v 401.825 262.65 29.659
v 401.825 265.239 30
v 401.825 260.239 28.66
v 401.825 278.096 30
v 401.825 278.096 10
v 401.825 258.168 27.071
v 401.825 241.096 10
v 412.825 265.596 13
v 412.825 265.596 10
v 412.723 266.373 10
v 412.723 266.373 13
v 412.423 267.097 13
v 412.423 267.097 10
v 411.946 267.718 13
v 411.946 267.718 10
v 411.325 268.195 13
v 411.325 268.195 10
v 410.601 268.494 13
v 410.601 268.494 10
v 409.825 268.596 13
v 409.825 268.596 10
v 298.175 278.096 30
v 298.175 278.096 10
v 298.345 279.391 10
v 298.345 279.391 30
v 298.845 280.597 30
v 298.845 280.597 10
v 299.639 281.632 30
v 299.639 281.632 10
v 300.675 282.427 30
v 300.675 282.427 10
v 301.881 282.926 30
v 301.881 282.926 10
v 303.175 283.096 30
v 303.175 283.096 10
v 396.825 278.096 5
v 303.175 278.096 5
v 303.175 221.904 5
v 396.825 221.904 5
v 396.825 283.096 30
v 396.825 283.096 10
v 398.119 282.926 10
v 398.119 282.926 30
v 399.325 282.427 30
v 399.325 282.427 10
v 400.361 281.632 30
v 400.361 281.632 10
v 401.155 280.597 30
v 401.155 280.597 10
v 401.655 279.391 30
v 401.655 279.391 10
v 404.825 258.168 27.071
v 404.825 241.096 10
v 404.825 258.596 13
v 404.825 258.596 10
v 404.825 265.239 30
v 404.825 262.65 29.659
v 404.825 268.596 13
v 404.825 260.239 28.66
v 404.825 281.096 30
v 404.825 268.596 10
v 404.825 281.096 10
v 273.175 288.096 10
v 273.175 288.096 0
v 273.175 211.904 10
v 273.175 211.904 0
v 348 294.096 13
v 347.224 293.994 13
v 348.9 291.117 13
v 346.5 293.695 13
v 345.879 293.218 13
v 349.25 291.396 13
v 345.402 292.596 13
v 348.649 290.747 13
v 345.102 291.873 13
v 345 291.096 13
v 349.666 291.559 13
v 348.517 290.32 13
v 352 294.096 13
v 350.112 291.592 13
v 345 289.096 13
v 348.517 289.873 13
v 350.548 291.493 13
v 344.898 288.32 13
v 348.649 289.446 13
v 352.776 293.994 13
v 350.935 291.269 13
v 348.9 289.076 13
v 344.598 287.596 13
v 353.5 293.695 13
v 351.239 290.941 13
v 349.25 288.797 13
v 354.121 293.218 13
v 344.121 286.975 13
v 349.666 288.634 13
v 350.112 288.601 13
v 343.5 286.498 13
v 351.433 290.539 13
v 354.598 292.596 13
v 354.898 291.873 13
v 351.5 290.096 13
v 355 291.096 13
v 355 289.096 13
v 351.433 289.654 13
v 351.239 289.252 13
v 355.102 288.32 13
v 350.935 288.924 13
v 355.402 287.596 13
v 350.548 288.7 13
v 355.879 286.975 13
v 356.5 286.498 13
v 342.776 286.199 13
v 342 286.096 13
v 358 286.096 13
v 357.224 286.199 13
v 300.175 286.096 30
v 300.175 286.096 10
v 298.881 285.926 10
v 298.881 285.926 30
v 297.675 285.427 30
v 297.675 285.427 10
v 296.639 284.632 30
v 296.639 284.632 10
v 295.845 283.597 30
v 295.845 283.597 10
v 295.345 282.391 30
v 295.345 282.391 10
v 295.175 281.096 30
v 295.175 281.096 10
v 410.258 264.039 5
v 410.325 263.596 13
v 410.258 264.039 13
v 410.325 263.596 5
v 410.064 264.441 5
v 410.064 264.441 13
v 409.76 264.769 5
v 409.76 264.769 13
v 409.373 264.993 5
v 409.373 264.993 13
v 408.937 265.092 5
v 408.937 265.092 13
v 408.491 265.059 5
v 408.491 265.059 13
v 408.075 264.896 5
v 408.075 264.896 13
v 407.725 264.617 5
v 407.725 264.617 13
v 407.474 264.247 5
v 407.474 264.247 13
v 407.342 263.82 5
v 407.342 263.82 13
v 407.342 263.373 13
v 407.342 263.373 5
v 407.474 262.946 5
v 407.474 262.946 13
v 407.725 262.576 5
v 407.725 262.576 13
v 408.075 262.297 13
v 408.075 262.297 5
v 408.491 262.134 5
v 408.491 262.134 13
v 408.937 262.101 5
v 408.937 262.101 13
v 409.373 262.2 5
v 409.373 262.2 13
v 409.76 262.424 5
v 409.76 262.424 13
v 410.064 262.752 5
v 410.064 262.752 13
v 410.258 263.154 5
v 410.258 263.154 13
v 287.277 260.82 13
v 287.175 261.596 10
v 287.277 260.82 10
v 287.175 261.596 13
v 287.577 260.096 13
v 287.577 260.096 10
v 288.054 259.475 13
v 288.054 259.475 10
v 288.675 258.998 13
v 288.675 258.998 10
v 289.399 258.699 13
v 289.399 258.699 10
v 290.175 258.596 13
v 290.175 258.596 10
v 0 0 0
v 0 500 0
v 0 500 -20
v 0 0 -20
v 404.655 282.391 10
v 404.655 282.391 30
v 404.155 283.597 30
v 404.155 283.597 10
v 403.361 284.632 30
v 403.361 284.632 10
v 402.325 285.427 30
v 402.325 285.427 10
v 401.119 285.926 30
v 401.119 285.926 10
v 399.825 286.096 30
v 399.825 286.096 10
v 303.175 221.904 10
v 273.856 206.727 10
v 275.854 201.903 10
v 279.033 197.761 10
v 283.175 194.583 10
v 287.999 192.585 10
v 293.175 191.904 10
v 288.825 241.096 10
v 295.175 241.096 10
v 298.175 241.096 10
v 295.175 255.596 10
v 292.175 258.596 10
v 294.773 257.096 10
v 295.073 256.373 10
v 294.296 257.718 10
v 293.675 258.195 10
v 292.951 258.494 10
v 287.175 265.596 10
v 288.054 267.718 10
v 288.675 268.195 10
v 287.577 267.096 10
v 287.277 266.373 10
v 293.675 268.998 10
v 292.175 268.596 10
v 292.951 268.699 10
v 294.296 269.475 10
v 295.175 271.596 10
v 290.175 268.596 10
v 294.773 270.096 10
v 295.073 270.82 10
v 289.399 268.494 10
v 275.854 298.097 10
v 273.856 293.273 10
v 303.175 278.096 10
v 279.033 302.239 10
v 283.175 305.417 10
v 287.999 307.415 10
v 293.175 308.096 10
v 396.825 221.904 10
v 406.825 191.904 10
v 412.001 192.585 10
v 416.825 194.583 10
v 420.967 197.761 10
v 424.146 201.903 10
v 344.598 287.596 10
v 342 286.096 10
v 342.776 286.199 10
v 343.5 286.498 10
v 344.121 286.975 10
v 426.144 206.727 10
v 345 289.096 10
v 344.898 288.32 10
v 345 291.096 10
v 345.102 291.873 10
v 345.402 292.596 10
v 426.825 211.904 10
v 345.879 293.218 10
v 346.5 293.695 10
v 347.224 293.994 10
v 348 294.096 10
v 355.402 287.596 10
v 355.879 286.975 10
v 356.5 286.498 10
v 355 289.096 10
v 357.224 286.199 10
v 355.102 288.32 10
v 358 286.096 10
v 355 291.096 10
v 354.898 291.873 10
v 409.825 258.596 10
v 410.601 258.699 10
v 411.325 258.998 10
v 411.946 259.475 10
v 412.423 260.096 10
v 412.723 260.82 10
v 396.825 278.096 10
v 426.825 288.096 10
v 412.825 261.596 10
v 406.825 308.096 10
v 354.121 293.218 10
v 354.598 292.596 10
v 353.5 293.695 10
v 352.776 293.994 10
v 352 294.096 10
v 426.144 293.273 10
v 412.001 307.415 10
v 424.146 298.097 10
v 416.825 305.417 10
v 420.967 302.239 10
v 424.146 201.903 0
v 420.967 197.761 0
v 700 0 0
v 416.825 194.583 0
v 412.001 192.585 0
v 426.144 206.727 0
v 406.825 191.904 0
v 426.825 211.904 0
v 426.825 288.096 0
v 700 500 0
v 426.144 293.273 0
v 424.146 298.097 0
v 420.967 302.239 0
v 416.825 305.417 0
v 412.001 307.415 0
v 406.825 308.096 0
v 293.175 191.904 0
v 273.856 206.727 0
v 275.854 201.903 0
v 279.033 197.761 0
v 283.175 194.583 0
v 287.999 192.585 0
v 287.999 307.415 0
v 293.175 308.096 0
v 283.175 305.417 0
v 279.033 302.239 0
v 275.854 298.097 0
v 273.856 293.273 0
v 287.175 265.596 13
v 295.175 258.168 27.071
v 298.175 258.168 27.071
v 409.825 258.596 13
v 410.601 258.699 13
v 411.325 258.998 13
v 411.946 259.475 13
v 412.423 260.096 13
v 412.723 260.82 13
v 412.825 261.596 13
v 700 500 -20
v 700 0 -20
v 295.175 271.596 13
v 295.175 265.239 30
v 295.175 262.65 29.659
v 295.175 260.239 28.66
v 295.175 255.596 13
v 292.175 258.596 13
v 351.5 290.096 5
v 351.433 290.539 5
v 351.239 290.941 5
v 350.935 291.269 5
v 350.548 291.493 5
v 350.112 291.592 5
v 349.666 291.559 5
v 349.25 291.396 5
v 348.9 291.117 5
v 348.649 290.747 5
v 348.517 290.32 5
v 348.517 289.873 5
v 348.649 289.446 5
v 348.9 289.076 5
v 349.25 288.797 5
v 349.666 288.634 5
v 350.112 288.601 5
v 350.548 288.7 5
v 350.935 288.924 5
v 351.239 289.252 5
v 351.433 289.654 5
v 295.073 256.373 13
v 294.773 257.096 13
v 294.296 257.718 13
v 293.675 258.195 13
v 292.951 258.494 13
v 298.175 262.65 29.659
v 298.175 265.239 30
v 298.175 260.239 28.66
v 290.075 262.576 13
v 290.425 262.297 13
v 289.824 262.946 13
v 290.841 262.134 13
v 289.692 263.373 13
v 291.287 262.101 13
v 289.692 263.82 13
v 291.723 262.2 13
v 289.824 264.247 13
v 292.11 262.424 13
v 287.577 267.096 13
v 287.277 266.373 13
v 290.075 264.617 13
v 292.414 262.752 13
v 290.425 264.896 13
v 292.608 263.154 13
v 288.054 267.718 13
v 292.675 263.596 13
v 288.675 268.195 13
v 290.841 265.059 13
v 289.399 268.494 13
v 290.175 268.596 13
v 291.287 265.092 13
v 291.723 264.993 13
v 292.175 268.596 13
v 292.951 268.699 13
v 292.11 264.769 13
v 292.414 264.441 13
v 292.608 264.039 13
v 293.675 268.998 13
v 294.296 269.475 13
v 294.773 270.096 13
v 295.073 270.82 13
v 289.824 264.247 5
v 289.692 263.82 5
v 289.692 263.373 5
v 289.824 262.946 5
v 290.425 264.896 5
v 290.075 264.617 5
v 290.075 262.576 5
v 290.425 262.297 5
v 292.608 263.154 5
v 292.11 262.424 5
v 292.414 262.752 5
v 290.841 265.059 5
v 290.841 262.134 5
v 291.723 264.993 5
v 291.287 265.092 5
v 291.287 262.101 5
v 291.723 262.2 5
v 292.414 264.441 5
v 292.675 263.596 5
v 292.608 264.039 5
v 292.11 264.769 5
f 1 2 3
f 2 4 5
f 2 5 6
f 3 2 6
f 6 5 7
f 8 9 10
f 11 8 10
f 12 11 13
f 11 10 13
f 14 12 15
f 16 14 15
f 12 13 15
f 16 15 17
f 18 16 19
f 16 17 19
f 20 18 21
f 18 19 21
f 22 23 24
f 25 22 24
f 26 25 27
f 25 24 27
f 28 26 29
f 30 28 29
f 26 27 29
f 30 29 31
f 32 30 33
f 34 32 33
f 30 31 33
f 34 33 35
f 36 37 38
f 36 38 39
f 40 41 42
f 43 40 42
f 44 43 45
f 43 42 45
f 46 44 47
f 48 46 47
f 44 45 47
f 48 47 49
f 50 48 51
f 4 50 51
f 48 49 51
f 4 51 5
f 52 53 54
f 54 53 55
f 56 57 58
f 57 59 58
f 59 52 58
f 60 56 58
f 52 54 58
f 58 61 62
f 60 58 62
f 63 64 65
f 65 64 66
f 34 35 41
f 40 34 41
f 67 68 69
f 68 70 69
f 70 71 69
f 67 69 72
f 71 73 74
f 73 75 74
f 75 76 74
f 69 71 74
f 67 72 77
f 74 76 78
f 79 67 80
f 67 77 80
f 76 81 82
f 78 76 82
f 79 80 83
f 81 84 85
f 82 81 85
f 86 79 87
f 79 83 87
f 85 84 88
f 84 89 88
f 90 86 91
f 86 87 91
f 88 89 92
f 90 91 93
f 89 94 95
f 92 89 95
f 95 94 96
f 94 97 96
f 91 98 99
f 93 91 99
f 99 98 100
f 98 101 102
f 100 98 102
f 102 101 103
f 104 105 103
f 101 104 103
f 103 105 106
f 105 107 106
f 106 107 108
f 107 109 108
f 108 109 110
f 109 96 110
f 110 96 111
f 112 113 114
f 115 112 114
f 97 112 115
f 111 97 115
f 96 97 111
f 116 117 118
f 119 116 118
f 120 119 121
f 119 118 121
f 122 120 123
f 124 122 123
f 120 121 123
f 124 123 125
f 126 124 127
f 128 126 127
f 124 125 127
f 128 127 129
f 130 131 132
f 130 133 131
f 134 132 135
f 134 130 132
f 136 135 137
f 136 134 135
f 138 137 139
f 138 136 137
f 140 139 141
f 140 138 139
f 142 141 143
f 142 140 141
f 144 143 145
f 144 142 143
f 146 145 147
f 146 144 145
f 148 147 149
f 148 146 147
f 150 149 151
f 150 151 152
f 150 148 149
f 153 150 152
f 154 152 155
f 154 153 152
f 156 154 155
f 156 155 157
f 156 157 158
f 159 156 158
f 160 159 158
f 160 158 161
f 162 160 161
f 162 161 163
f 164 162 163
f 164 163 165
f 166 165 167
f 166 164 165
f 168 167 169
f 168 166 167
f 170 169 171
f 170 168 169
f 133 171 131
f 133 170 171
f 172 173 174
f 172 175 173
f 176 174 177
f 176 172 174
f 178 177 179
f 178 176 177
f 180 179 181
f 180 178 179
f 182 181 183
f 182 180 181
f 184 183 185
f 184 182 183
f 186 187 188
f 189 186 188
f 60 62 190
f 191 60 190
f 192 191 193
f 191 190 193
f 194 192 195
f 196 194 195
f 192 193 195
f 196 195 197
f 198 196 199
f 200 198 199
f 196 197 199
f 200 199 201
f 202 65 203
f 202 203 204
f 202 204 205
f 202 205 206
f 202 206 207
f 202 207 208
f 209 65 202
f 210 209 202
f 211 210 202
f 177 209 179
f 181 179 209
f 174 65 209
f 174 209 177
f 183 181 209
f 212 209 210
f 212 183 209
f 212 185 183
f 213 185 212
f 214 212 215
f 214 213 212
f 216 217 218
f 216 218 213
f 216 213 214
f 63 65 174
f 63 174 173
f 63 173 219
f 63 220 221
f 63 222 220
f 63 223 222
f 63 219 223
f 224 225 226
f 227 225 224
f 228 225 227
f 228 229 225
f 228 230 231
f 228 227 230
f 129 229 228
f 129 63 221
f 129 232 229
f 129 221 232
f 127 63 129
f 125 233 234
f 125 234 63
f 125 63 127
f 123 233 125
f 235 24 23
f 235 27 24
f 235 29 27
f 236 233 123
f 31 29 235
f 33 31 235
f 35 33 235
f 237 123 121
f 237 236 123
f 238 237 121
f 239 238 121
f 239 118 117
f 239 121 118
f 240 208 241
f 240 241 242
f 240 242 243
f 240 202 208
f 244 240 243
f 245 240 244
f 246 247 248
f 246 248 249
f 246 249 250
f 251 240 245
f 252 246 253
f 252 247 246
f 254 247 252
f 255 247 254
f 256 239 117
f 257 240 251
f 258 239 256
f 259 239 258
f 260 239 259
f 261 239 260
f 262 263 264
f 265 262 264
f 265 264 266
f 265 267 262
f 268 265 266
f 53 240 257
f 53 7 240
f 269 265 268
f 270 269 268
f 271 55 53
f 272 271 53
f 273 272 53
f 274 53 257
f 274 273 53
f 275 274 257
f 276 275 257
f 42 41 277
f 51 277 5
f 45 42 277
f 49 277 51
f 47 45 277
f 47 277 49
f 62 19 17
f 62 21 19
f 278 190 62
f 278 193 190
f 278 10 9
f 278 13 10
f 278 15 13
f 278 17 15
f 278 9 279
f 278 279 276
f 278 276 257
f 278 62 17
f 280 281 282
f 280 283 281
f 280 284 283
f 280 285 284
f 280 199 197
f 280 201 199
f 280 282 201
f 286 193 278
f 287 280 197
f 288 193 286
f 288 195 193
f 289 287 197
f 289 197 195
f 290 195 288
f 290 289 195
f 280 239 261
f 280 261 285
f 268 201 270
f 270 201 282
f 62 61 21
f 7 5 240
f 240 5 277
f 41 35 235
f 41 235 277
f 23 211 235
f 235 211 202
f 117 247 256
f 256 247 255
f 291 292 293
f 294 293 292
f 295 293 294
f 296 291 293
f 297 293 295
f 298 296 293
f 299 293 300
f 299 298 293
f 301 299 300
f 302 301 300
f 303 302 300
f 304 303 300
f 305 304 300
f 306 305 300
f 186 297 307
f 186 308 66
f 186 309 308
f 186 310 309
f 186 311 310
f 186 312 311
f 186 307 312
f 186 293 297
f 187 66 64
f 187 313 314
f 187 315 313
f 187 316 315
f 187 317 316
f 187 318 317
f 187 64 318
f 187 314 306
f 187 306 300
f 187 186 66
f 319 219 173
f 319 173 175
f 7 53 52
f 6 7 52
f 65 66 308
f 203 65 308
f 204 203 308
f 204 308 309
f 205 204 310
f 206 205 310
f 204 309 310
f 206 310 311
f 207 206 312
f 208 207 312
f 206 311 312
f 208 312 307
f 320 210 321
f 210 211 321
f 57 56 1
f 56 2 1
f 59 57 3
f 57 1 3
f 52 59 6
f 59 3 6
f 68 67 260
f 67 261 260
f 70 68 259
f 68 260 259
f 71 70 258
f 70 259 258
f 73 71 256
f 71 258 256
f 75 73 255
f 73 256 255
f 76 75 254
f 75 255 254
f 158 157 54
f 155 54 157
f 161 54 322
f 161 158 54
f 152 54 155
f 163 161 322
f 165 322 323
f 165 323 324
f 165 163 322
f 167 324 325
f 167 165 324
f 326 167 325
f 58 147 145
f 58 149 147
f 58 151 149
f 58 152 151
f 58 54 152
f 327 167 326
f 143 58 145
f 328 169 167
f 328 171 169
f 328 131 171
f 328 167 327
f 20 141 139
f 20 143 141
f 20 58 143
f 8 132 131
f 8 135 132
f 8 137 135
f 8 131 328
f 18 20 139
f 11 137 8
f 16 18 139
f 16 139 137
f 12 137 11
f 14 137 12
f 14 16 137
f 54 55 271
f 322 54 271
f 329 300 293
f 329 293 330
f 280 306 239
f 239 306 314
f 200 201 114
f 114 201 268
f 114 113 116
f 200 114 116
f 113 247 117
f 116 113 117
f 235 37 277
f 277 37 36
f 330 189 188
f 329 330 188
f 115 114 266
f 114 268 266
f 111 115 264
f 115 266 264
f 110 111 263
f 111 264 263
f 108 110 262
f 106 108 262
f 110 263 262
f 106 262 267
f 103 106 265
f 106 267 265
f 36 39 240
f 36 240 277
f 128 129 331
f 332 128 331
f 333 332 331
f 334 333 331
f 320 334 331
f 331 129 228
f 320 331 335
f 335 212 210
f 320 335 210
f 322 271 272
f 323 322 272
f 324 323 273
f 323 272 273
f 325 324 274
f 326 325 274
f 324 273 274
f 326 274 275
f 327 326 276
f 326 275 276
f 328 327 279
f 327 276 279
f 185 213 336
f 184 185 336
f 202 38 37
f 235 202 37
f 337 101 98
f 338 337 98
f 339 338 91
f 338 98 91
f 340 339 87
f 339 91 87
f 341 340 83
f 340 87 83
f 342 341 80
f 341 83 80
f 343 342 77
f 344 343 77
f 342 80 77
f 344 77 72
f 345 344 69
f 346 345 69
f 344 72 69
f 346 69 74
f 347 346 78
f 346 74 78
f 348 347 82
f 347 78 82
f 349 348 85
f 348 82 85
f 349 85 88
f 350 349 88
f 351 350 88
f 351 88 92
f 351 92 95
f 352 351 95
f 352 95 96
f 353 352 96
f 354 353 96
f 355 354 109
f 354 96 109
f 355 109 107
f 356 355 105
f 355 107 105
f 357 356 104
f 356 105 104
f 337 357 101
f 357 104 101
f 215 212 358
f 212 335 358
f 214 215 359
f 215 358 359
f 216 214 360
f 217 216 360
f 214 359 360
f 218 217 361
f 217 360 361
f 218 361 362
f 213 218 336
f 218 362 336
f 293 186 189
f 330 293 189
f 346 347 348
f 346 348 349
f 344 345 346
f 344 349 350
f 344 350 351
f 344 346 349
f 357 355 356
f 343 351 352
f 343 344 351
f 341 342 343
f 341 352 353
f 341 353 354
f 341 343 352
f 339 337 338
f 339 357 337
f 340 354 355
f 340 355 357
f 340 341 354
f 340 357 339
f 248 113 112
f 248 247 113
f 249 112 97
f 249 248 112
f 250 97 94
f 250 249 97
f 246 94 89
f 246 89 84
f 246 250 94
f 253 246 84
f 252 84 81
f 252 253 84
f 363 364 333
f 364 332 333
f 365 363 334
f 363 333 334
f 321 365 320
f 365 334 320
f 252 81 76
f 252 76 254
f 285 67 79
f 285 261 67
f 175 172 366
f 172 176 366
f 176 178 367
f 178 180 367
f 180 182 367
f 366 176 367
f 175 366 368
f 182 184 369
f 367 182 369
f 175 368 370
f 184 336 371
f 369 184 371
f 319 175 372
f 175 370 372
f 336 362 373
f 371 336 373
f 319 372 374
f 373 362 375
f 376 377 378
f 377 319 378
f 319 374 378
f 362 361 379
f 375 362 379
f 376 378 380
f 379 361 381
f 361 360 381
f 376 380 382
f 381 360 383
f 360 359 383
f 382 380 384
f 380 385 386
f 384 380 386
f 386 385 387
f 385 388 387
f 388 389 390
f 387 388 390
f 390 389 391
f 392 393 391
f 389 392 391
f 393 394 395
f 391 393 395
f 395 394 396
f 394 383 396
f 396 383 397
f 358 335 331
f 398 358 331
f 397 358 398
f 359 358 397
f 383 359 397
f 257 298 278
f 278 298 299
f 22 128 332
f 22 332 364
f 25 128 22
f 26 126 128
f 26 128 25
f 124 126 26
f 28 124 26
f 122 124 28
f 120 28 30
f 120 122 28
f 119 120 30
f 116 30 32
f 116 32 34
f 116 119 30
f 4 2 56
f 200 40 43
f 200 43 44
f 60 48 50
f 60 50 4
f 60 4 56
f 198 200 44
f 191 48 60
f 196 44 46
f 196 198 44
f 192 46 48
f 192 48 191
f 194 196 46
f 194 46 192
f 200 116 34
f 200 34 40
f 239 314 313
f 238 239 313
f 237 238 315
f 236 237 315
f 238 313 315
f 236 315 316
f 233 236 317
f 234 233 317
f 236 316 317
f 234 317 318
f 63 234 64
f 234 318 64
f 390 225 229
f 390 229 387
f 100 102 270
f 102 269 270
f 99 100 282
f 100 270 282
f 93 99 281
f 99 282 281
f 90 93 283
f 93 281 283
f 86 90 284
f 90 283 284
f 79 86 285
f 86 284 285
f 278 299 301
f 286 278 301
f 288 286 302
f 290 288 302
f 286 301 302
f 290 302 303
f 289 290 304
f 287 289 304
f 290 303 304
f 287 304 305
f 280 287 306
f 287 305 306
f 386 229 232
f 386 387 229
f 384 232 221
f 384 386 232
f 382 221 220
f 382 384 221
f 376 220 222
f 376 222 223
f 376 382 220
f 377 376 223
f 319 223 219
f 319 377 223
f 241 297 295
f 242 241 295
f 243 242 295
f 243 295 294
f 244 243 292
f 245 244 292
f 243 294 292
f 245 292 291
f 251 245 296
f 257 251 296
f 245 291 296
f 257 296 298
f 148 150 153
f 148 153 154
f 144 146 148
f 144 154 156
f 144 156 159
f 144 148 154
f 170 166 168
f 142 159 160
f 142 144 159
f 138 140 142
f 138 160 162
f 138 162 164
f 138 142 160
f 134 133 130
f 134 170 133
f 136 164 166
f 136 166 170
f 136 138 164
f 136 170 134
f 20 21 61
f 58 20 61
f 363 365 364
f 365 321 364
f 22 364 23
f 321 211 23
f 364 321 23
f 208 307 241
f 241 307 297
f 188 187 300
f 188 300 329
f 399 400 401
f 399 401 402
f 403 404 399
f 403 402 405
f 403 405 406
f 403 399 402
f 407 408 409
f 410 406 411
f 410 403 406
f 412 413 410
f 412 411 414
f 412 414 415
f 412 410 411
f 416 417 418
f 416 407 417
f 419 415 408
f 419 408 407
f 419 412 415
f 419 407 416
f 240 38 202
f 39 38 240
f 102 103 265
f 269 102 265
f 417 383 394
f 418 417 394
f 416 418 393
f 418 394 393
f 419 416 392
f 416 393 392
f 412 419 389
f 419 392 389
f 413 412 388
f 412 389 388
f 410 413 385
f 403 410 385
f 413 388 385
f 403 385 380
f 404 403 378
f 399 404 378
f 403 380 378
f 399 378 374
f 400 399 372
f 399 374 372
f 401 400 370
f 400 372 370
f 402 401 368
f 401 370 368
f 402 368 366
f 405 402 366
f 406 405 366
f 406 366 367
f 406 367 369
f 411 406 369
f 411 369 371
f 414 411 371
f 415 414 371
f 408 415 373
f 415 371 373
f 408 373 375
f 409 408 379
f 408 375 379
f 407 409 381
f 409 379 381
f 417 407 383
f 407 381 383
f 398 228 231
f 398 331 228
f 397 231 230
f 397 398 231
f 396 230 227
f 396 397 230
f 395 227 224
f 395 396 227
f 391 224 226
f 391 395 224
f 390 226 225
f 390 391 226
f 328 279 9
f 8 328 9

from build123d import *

# Parameters (mm, degrees)
ESBO_O2_W                = 20
ESBO_O2_H                = 500
RESSALTO_EXTRUS_O1_DEPTH = 700
ESBO_O3_W                = 93.65
ESBO_O3_H                = 56.193
RESSALTO_EXTRUS_O2_DEPTH = 5
ESBO_O5_W                = 93.65
ESBO_O5_H                = 56.193
RESSALTO_EXTRUS_O3_DEPTH = 10
RESSALTO_EXTRUS_O4_DEPTH = 20
CORTE_EXTRUS_O1_DEPTH    = 116
FILETE1_R                = 10
ESBO_O8_W                = 3
ESBO_O8_H                = 10
RESSALTO_EXTRUS_O5_DEPTH = 8
FILETE2_R                = 3
ESBO_O9_R                = 1.5
CORTE_EXTRUS_O2_DEPTH    = 8
ESPELHAR1_START          = 5
ESPELHAR1_OUTLINE_R      = 1.5
ESPELHAR1_DEPTH          = 5
ESPELHAR1_START_2        = 10
ESPELHAR1_2_OUTLINE_R    = 1.5
ESPELHAR1_2_DEPTH        = 3
ESBO_O12_W               = 10
ESBO_O12_H               = 3
RESSALTO_EXTRUS_O6_DEPTH = 8
FILETE3_R                = 3
ESBO_O13_R               = 1.5
CORTE_EXTRUS_O3_DEPTH    = 8


# Read off the part's stored shape, not the designer's step: Espelhar1
with BuildPart() as part:
    # Esboço2 → Ressalto-extrusão1 (new body)
    with BuildSketch(Plane(origin=(0, 0, 0), x_dir=(0, 0, -1), z_dir=(1, 0, 0))):
        with Locations((10, 250)):
            Rectangle(ESBO_O2_W, ESBO_O2_H)
    extrude(amount=RESSALTO_EXTRUS_O1_DEPTH)

    # Esboço3 → Ressalto-extrusão2 (add)
    with BuildSketch(Plane.XY):
        with Locations((350, 250)):
            Rectangle(ESBO_O3_W, ESBO_O3_H)
    extrude(amount=RESSALTO_EXTRUS_O2_DEPTH)

    # Esboço5 → Ressalto-extrusão3 (add)
    with BuildSketch(Plane.XY):
        with BuildLine():
            Line((293.175, 191.9035), (406.825, 191.9035))
            ThreePointArc((406.825, 191.9035), (420.967135624, 197.761364376), (426.825, 211.9035))
            Line((426.825, 211.9035), (426.825, 288.0965))
            ThreePointArc((426.825, 288.0965), (420.967135624, 302.238635624), (406.825, 308.0965))
            Line((406.825, 308.0965), (293.175, 308.0965))
            ThreePointArc((293.175, 308.0965), (279.032864376, 302.238635624), (273.175, 288.0965))
            Line((273.175, 288.0965), (273.175, 211.9035))
            ThreePointArc((273.175, 211.9035), (279.032864376, 197.761364376), (293.175, 191.9035))
        make_face()
        with Locations((350, 250)):
            Rectangle(ESBO_O5_W, ESBO_O5_H, mode=Mode.SUBTRACT)
    extrude(amount=RESSALTO_EXTRUS_O3_DEPTH)

    # Esboço6 → Ressalto-extrusão4 (add)
    with BuildSketch(Plane.XY.offset(10)):
        with BuildLine():
            Line((298.175, 241.0965), (298.175, 278.0965))
            ThreePointArc((298.175, 278.0965), (299.639466094, 281.632033906), (303.175, 283.0965))
            Line((303.175, 283.0965), (396.825, 283.0965))
            ThreePointArc((396.825, 283.0965), (400.360533906, 281.632033906), (401.825, 278.0965))
            Line((401.825, 278.0965), (401.825, 241.0965))
            Line((401.825, 241.0965), (404.825, 241.0965))
            Line((404.825, 241.0965), (404.825, 281.0965))
            ThreePointArc((404.825, 281.0965), (403.360533906, 284.632033906), (399.825, 286.0965))
            Line((399.825, 286.0965), (300.175, 286.0965))
            ThreePointArc((300.175, 286.0965), (296.639466094, 284.632033906), (295.175, 281.0965))
            Line((295.175, 281.0965), (295.175, 241.0965))
            Line((295.175, 241.0965), (298.175, 241.0965))
        make_face()
    extrude(amount=RESSALTO_EXTRUS_O4_DEPTH)

    # Esboço7 → Corte-extrusão1 (cut)
    with BuildSketch(Plane(origin=(404.825, 0, 0), x_dir=(0, 0, -1), z_dir=(1, 0, 0))):
        Polygon((-10, 241.0965), (-30, 261.0965), (-30, 241.0965), align=None)
    extrude(amount=-CORTE_EXTRUS_O1_DEPTH, mode=Mode.SUBTRACT)

    # Filete1
    filete1_edges = [part.edges().sort_by_distance(p)[0] for p in [
        (403.325, 261.0965, 30),
        (296.675, 261.0965, 30),
    ]]
    fillet(filete1_edges, radius=FILETE1_R)

    # Esboço8 → Ressalto-extrusão5 (add)
    with BuildSketch(Plane.ZY.offset(-295.175)):
        with Locations((11.5, 263.5965)):
            Rectangle(ESBO_O8_W, ESBO_O8_H)
    extrude(amount=RESSALTO_EXTRUS_O5_DEPTH)

    # Filete2
    filete2_edges = [part.edges().sort_by_distance(p)[0] for p in [
        (295.175, 258.5965, 11.5),
        (295.175, 268.5965, 11.5),
        (287.175, 258.5965, 11.5),
        (287.175, 268.5965, 11.5),
    ]]
    fillet(filete2_edges, radius=FILETE2_R)

    # Esboço9 → Corte-extrusão2 (cut)
    with BuildSketch(Plane.XY.offset(13)):
        with Locations((291.175, 263.5965)):
            Circle(ESBO_O9_R)
    extrude(amount=-CORTE_EXTRUS_O2_DEPTH, mode=Mode.SUBTRACT)

    # Espelhar1 outline → Espelhar1 (cut)
    with BuildSketch(Plane.XY.offset(ESPELHAR1_START)):
        with Locations((408.825, 263.5965)):
            Circle(ESPELHAR1_OUTLINE_R)
    extrude(amount=ESPELHAR1_DEPTH, mode=Mode.SUBTRACT)

    # Espelhar1 2 outline → Espelhar1 2 (add)
    with BuildSketch(Plane.XY.offset(ESPELHAR1_START_2)):
        with BuildLine():
            Line((404.825, 268.5965), (404.825, 258.5965))
            Line((404.825, 258.5965), (409.825, 258.5965))
            ThreePointArc((409.825, 258.5965), (411.946320344, 259.475179656), (412.825, 261.5965))
            Line((412.825, 261.5965), (412.825, 265.5965))
            ThreePointArc((412.825, 265.5965), (411.946320344, 267.717820344), (409.825, 268.5965))
            Line((409.825, 268.5965), (404.825, 268.5965))
        make_face()
        with Locations((408.825, 263.5965)):
            Circle(ESPELHAR1_2_OUTLINE_R, mode=Mode.SUBTRACT)
    extrude(amount=ESPELHAR1_2_DEPTH)

    # Esboço12 → Ressalto-extrusão6 (add)
    with BuildSketch(Plane(origin=(0, 286.0965, 0), x_dir=(1, 0, 0), z_dir=(0, 1, 0))):
        with Locations((350, -11.5)):
            Rectangle(ESBO_O12_W, ESBO_O12_H)
    extrude(amount=RESSALTO_EXTRUS_O6_DEPTH)

    # Filete3
    filete3_edges = [part.edges().sort_by_distance(p)[0] for p in [
        (355, 286.0965, 11.5),
        (345, 286.0965, 11.5),
        (355, 294.0965, 11.5),
        (345, 294.0965, 11.5),
    ]]
    fillet(filete3_edges, radius=FILETE3_R)

    # Esboço13 → Corte-extrusão3 (cut)
    with BuildSketch(Plane.XY.offset(13)):
        with Locations((350, 290.0965)):
            Circle(ESBO_O13_R)
    extrude(amount=-CORTE_EXTRUS_O3_DEPTH, mode=Mode.SUBTRACT)


solid = part.part
